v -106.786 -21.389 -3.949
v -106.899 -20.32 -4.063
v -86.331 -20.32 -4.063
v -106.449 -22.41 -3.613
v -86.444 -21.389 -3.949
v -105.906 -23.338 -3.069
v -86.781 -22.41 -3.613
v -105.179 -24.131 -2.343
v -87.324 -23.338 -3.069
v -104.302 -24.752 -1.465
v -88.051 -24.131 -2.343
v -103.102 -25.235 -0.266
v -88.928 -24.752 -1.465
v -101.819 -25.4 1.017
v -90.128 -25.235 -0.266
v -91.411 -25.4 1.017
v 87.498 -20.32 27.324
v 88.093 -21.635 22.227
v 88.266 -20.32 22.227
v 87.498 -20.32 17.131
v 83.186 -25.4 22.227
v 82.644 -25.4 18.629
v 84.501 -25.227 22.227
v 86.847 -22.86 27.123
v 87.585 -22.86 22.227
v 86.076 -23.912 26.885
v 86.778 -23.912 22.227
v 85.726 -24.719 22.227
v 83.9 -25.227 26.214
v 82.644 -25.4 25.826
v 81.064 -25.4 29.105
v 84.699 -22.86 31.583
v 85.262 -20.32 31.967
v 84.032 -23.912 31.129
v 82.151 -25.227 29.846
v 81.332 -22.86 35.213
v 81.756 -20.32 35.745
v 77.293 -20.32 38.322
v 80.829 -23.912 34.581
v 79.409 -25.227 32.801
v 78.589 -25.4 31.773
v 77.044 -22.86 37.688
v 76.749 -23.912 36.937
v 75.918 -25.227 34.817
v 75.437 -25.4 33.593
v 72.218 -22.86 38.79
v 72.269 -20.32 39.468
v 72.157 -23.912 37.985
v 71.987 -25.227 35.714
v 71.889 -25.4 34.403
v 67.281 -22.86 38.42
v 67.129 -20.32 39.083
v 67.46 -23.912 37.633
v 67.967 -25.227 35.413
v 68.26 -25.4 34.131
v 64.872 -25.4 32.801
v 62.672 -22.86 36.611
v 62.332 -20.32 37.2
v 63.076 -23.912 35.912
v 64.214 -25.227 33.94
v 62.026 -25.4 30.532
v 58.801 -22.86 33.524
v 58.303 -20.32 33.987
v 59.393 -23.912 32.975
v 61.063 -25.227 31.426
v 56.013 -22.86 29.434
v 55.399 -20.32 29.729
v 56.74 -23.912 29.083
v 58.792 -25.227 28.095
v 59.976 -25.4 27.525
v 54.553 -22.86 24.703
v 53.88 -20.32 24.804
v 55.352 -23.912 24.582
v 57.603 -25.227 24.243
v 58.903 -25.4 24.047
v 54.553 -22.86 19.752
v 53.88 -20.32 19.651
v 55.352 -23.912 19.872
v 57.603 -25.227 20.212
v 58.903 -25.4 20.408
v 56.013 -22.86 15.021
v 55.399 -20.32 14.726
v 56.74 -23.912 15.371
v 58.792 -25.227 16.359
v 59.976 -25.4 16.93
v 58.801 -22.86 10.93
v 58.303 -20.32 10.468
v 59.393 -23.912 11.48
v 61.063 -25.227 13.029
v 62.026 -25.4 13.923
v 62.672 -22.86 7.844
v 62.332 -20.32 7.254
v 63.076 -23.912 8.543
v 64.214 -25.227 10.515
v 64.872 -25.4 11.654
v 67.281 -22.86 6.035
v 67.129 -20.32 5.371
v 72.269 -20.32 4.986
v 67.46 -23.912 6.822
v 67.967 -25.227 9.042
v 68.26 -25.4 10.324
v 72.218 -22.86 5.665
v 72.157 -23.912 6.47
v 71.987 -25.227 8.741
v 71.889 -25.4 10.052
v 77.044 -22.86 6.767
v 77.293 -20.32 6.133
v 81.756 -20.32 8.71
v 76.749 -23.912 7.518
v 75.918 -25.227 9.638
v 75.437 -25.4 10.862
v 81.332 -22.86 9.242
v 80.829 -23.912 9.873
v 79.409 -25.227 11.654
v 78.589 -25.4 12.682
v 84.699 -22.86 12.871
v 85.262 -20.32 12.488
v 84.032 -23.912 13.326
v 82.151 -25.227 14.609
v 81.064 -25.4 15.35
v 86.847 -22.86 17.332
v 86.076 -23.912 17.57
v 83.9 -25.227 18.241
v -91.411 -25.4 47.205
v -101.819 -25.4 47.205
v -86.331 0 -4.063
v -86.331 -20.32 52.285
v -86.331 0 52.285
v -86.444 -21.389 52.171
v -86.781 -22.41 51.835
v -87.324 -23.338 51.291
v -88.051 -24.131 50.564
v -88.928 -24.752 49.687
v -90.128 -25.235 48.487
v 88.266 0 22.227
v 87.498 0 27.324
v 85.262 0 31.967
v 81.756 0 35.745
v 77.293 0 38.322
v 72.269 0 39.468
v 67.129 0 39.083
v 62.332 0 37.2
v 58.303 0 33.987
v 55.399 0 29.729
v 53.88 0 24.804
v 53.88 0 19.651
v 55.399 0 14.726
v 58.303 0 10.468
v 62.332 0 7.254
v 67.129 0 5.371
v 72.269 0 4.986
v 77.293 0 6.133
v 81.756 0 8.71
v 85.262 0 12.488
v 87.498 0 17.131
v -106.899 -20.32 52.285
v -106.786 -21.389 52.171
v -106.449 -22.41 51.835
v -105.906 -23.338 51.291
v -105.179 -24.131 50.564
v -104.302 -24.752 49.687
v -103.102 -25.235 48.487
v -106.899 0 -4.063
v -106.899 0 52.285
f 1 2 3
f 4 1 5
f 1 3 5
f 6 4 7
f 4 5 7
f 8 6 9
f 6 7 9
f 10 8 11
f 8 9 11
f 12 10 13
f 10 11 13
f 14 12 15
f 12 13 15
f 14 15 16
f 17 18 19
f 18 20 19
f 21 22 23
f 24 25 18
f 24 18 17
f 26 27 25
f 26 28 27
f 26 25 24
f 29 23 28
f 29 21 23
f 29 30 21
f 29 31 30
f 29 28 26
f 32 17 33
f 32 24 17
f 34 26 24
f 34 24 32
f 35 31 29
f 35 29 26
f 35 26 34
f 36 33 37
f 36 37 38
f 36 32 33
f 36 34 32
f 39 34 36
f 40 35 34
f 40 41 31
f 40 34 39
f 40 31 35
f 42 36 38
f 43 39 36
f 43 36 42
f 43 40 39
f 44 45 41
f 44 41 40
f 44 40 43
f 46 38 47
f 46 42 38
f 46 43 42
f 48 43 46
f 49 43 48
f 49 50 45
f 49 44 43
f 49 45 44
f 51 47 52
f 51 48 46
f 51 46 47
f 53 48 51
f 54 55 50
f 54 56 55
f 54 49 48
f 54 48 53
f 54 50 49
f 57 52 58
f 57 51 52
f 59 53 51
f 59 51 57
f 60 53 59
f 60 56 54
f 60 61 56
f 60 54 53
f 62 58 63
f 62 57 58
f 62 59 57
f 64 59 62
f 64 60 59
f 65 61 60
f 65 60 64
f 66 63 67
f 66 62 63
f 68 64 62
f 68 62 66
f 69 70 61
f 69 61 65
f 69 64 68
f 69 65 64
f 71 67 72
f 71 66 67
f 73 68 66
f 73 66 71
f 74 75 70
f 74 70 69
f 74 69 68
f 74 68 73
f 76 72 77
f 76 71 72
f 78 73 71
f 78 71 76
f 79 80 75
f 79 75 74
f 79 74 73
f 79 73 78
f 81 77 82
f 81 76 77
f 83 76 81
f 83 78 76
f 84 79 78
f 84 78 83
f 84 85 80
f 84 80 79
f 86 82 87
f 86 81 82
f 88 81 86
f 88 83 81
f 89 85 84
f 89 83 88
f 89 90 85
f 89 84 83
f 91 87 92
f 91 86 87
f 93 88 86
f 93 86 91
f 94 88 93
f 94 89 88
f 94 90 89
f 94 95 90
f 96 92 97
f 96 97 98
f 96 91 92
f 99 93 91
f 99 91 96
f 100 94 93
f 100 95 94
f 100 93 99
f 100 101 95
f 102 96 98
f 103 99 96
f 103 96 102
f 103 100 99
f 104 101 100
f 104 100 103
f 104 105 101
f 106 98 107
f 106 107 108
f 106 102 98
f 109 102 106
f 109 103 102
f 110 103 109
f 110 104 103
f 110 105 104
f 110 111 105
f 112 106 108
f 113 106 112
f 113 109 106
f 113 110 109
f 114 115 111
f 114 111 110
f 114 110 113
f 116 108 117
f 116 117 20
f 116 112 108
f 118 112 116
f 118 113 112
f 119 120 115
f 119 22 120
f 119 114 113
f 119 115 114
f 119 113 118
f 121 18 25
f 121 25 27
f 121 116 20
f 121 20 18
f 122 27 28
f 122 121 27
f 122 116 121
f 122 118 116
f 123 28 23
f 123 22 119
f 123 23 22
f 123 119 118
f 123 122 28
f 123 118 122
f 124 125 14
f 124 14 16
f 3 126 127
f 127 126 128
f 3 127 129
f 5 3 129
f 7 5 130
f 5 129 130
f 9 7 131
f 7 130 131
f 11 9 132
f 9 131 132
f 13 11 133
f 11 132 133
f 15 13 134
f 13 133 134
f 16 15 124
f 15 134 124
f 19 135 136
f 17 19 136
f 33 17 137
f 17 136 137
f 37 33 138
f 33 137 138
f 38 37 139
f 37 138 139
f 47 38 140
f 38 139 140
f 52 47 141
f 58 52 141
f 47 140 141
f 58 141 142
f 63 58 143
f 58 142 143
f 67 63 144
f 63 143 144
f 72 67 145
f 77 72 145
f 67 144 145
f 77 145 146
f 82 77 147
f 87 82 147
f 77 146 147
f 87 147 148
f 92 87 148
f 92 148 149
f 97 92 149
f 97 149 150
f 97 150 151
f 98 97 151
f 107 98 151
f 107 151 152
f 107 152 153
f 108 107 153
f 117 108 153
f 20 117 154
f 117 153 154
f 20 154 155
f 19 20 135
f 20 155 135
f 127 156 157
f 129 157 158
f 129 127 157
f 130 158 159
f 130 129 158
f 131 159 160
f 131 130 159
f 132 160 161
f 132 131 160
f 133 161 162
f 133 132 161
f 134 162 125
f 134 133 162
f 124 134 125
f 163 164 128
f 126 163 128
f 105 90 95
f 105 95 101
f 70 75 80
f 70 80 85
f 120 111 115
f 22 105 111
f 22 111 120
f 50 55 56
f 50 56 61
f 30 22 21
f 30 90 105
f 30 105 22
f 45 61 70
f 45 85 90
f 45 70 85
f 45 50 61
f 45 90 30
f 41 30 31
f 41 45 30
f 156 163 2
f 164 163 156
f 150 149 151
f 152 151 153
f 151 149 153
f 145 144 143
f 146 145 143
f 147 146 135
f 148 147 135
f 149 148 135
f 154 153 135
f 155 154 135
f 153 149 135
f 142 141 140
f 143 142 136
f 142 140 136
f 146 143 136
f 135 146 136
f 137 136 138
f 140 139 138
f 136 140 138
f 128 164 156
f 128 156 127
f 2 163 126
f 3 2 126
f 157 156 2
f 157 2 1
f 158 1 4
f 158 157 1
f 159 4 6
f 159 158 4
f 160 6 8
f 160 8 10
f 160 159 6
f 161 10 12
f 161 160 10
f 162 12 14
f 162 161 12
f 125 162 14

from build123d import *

# Parameters (mm, degrees)
F0_W     = 20.568713
F0_H     = 56.347868
F0_R     = 17.289421
F1_DEPTH = 25.4
F2_R     = 5.08


with BuildPart() as f1:
    # F0 (on Front) → F1 (new body)
    with BuildSketch(Plane.XZ):
        with Locations((-96.615016, 24.110832)):
            Rectangle(F0_W, F0_H)
        with Locations((70.976548, 22.227371)):
            Circle(F0_R)
    extrude(amount=F1_DEPTH)

    # F2
    f2_edges = [f1.edges().sort_by_distance(p)[0] for p in [
        (-96.615016, -25.4, 52.284766),
        (-106.899373, -25.4, 24.110832),
        (-96.615016, -25.4, -4.063102),
        (-86.33066, -25.4, 24.110832),
        (53.687127, -25.4, 22.227371),
    ]]
    fillet(f2_edges, radius=F2_R)


solid = f1.part
